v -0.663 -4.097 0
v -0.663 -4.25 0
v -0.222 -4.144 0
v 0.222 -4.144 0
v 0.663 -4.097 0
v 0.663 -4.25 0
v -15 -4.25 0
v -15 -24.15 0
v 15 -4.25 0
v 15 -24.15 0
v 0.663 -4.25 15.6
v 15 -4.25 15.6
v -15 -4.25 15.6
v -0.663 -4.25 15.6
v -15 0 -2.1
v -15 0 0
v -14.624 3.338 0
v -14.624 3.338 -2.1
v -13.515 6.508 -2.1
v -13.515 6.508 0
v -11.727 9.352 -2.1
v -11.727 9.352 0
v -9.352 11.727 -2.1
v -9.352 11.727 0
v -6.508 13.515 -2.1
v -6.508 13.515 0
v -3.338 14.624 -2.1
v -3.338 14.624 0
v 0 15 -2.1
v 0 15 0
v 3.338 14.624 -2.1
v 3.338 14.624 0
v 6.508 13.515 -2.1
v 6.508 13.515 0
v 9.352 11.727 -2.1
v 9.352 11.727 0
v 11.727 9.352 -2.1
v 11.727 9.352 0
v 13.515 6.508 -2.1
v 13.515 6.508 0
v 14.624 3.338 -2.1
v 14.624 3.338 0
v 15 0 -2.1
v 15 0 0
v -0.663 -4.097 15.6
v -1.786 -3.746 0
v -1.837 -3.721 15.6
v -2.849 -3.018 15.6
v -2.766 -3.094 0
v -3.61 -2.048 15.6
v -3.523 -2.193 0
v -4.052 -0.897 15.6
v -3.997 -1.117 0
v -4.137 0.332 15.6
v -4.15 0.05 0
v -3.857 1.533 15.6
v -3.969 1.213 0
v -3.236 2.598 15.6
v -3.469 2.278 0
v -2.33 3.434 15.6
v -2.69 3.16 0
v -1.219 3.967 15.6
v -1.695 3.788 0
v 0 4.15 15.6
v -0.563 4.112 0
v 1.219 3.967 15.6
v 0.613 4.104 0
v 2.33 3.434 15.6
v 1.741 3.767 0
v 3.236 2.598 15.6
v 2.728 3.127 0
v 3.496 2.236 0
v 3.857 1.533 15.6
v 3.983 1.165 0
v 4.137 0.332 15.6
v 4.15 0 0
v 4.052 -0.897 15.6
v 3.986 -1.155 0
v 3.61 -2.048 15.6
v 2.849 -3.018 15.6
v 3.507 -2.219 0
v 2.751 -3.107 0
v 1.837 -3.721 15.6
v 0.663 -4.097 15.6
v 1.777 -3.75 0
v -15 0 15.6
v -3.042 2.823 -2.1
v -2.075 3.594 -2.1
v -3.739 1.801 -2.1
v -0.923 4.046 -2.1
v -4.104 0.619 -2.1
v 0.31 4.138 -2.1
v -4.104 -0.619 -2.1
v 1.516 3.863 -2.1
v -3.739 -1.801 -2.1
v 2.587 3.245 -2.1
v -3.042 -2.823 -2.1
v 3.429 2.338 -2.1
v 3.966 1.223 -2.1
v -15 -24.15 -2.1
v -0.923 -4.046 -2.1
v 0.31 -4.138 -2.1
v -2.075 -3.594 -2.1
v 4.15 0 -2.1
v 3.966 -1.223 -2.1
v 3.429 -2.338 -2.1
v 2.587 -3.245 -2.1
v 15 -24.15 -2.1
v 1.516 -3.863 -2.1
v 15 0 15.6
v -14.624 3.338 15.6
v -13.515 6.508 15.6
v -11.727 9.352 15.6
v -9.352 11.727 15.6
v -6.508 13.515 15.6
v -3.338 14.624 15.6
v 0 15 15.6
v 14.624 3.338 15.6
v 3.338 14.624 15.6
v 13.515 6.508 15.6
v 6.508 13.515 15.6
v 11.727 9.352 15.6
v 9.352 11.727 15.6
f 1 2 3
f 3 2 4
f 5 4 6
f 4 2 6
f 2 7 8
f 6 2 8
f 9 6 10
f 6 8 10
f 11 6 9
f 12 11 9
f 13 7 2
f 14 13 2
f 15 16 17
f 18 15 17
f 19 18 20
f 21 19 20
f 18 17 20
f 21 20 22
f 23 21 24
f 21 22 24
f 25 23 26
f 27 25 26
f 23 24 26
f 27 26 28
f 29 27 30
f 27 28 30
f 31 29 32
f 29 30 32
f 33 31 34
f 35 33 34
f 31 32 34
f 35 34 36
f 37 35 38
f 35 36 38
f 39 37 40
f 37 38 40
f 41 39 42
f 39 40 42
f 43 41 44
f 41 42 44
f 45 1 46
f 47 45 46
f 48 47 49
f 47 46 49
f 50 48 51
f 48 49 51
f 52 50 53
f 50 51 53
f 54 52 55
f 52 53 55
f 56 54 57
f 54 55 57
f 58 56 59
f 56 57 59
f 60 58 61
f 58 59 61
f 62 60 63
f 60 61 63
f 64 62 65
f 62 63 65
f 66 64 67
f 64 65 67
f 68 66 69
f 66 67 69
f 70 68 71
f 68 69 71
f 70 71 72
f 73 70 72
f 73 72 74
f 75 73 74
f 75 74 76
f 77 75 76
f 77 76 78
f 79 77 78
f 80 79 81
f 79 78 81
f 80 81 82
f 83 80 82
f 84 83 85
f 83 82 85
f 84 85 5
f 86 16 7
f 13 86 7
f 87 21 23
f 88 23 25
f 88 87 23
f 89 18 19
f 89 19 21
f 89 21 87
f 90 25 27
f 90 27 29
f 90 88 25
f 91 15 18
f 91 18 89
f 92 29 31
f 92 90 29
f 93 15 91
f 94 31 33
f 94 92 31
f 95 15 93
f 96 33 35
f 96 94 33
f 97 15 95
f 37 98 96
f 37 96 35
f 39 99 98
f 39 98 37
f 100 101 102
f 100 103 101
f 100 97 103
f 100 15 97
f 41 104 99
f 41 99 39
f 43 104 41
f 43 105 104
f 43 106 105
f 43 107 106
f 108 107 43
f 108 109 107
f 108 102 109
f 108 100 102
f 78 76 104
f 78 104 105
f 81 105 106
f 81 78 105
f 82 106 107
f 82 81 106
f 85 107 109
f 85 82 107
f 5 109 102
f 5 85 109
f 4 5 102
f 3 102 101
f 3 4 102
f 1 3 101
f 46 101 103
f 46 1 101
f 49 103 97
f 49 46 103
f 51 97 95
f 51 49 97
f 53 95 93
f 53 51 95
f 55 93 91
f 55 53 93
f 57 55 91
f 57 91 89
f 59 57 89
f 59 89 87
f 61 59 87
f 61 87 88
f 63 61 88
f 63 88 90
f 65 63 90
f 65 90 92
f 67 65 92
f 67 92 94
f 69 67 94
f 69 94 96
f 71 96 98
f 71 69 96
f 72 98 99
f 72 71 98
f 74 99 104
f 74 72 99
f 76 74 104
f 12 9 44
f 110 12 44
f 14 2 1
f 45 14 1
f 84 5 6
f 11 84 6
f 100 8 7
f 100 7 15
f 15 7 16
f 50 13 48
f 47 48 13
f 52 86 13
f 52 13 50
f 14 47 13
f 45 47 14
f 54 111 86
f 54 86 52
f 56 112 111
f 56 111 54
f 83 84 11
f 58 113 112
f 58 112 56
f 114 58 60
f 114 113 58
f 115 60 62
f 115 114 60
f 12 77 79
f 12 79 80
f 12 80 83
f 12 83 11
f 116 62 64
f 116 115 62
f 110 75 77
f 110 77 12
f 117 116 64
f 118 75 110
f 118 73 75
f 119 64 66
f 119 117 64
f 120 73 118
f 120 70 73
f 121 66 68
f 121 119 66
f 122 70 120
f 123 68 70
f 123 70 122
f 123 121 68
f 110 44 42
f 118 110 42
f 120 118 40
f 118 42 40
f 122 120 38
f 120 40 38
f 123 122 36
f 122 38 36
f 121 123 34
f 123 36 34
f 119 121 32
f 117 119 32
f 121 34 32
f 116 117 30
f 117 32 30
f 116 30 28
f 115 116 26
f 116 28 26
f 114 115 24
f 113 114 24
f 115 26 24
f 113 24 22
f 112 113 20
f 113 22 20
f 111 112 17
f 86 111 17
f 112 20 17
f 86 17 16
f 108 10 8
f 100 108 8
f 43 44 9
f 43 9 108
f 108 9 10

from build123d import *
from build123d import SkipClean  # not in build123d's __all__

# Parameters (mm, degrees)
F1_DEPTH = 15.6
F2_R     = 4.15
F3_DEPTH = 2.1


with BuildPart() as f1:
    # F0 (on Top) → F1 (new body)
    with BuildSketch(Plane.XY):
        with BuildLine():
            ThreePointArc((-0.6628195804, -4.096726767), (0, 4.15), (0.6628195804, -4.096726767))
            Line((0.6628195804, -4.096726767), (0.6628195804, -4.25))
            Line((0.6628195804, -4.25), (15, -4.25))
            Line((15, -4.25), (15, 0))
            ThreePointArc((15, 0), (0, 15), (-15, 0))
            Line((-15, 0), (-15, -4.25))
            Line((-15, -4.25), (-0.6628195804, -4.25))
            Line((-0.6628195804, -4.25), (-0.6628195804, -4.096726767))
        make_face()
    extrude(amount=F1_DEPTH)

    # F2 (on face) → F3 (join)
    with BuildSketch(Plane(origin=(0, 0, 0), x_dir=(1, 0, 0), z_dir=(0, 0, -1))):
        with BuildLine():
            ThreePointArc((-15, 0), (0, -15), (15, 0))
            Line((15, 0), (15, 24.15))
            Line((15, 24.15), (-15, 24.15))
            Line((-15, 24.15), (-15, 0))
        make_face()
        Circle(F2_R, mode=Mode.SUBTRACT)
    with SkipClean():  # cleaning this boolean's faces spoils the solid; the shape is the same uncleaned
        extrude(amount=F3_DEPTH)


solid = f1.part
